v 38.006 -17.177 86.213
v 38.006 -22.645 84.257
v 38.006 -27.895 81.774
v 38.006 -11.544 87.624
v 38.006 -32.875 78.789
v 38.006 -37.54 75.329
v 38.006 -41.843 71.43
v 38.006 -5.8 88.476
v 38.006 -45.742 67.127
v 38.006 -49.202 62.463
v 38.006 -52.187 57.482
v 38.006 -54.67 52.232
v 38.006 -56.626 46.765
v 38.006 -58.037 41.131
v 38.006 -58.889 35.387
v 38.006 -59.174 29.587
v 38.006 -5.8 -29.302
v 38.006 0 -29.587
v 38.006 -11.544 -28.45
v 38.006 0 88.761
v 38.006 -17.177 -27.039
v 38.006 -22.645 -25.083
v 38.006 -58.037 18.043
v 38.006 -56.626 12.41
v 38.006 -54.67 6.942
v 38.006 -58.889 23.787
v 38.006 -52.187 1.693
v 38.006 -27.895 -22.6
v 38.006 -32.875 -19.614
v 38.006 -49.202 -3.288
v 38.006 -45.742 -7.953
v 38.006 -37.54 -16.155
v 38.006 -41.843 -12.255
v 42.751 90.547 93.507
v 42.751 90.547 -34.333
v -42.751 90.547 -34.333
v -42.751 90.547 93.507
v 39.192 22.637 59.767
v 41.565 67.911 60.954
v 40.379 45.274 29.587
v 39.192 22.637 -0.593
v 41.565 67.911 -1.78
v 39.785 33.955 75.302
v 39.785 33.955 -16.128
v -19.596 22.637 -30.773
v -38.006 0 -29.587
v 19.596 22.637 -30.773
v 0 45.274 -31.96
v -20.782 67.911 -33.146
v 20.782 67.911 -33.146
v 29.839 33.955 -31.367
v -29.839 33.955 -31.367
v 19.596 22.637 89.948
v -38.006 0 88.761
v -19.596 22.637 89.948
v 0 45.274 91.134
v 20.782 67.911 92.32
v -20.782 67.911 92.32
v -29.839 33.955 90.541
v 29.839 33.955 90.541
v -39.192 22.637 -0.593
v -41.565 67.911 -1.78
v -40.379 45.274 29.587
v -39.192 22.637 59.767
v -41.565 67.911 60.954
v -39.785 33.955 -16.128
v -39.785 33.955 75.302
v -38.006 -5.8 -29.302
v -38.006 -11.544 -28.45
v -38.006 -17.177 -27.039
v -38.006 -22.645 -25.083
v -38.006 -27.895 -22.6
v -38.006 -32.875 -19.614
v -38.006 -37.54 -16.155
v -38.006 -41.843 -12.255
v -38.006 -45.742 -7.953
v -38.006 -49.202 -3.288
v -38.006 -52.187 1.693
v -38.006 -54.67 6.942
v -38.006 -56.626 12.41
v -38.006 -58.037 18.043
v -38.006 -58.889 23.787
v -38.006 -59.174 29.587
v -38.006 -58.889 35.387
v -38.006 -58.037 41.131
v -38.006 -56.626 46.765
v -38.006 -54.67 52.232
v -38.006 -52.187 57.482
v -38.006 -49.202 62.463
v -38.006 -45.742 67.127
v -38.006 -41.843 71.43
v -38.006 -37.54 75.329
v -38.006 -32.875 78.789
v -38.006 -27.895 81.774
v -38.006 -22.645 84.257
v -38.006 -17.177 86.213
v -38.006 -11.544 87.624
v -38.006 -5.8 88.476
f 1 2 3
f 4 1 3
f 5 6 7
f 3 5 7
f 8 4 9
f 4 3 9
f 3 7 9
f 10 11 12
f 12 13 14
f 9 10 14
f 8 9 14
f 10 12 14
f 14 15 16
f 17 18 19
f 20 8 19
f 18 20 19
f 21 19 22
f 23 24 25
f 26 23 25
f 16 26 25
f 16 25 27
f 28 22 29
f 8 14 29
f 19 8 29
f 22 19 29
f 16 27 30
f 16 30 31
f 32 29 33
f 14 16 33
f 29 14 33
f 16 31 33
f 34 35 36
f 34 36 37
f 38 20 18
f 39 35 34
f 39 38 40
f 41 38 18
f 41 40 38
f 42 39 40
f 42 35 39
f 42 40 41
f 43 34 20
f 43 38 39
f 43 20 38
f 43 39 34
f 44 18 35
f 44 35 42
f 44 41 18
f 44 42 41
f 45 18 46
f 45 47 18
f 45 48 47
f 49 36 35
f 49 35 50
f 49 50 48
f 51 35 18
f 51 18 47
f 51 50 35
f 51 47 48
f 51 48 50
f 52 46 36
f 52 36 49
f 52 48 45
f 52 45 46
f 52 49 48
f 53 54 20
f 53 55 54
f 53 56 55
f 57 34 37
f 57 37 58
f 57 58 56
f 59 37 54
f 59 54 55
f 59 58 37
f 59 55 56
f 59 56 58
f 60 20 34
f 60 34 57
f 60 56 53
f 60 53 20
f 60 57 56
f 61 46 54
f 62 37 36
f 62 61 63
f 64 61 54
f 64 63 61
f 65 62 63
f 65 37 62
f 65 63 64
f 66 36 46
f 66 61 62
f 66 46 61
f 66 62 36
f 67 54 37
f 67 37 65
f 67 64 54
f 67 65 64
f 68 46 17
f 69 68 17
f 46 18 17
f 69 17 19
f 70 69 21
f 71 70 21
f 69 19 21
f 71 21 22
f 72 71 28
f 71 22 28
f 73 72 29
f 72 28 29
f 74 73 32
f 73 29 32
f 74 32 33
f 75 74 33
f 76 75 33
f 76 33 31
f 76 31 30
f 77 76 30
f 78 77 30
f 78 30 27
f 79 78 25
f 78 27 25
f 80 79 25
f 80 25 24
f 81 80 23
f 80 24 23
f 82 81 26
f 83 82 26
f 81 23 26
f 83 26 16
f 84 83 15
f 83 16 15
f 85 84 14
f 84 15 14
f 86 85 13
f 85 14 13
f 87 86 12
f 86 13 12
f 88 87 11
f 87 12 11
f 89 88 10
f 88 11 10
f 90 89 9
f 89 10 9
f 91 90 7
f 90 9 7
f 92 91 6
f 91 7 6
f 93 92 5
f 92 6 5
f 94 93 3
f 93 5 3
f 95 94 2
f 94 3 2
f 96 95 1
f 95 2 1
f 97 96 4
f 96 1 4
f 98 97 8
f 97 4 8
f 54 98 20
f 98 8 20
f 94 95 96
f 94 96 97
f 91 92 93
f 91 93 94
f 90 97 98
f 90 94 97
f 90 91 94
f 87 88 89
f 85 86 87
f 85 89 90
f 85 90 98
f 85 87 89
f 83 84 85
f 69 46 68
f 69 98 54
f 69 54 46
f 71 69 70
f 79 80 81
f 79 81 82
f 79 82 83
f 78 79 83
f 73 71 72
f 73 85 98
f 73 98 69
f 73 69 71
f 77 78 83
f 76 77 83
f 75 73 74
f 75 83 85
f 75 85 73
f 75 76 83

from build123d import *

# Parameters (mm, degrees)
F0_W      = 76.0117769241
F0_H      = 59.1742545366
F1_ANGLE  = 180
F1_FACE_W = 76.0117769241
F1_FACE_H = 118.3485090733
F2_DEPTH  = 90.5473530293
F2_TAPER  = -3


with BuildPart() as f1:
    # F0 (on Front) → F1 (revolve)
    with BuildSketch(Plane.XZ):
        Rectangle(F0_W, F0_H)
    revolve(axis=Axis((0, 0, 29.5871272683), (-1, 0, 0)), revolution_arc=F1_ANGLE)

    # F1_face (on face) → F2 (join)
    with BuildSketch(Plane(origin=(0, 0, 29.5871272683), x_dir=(-1, 0, 0), z_dir=(0, 1, 0))):
        Rectangle(F1_FACE_W, F1_FACE_H)
    extrude(amount=F2_DEPTH, taper=F2_TAPER)


solid = f1.part
